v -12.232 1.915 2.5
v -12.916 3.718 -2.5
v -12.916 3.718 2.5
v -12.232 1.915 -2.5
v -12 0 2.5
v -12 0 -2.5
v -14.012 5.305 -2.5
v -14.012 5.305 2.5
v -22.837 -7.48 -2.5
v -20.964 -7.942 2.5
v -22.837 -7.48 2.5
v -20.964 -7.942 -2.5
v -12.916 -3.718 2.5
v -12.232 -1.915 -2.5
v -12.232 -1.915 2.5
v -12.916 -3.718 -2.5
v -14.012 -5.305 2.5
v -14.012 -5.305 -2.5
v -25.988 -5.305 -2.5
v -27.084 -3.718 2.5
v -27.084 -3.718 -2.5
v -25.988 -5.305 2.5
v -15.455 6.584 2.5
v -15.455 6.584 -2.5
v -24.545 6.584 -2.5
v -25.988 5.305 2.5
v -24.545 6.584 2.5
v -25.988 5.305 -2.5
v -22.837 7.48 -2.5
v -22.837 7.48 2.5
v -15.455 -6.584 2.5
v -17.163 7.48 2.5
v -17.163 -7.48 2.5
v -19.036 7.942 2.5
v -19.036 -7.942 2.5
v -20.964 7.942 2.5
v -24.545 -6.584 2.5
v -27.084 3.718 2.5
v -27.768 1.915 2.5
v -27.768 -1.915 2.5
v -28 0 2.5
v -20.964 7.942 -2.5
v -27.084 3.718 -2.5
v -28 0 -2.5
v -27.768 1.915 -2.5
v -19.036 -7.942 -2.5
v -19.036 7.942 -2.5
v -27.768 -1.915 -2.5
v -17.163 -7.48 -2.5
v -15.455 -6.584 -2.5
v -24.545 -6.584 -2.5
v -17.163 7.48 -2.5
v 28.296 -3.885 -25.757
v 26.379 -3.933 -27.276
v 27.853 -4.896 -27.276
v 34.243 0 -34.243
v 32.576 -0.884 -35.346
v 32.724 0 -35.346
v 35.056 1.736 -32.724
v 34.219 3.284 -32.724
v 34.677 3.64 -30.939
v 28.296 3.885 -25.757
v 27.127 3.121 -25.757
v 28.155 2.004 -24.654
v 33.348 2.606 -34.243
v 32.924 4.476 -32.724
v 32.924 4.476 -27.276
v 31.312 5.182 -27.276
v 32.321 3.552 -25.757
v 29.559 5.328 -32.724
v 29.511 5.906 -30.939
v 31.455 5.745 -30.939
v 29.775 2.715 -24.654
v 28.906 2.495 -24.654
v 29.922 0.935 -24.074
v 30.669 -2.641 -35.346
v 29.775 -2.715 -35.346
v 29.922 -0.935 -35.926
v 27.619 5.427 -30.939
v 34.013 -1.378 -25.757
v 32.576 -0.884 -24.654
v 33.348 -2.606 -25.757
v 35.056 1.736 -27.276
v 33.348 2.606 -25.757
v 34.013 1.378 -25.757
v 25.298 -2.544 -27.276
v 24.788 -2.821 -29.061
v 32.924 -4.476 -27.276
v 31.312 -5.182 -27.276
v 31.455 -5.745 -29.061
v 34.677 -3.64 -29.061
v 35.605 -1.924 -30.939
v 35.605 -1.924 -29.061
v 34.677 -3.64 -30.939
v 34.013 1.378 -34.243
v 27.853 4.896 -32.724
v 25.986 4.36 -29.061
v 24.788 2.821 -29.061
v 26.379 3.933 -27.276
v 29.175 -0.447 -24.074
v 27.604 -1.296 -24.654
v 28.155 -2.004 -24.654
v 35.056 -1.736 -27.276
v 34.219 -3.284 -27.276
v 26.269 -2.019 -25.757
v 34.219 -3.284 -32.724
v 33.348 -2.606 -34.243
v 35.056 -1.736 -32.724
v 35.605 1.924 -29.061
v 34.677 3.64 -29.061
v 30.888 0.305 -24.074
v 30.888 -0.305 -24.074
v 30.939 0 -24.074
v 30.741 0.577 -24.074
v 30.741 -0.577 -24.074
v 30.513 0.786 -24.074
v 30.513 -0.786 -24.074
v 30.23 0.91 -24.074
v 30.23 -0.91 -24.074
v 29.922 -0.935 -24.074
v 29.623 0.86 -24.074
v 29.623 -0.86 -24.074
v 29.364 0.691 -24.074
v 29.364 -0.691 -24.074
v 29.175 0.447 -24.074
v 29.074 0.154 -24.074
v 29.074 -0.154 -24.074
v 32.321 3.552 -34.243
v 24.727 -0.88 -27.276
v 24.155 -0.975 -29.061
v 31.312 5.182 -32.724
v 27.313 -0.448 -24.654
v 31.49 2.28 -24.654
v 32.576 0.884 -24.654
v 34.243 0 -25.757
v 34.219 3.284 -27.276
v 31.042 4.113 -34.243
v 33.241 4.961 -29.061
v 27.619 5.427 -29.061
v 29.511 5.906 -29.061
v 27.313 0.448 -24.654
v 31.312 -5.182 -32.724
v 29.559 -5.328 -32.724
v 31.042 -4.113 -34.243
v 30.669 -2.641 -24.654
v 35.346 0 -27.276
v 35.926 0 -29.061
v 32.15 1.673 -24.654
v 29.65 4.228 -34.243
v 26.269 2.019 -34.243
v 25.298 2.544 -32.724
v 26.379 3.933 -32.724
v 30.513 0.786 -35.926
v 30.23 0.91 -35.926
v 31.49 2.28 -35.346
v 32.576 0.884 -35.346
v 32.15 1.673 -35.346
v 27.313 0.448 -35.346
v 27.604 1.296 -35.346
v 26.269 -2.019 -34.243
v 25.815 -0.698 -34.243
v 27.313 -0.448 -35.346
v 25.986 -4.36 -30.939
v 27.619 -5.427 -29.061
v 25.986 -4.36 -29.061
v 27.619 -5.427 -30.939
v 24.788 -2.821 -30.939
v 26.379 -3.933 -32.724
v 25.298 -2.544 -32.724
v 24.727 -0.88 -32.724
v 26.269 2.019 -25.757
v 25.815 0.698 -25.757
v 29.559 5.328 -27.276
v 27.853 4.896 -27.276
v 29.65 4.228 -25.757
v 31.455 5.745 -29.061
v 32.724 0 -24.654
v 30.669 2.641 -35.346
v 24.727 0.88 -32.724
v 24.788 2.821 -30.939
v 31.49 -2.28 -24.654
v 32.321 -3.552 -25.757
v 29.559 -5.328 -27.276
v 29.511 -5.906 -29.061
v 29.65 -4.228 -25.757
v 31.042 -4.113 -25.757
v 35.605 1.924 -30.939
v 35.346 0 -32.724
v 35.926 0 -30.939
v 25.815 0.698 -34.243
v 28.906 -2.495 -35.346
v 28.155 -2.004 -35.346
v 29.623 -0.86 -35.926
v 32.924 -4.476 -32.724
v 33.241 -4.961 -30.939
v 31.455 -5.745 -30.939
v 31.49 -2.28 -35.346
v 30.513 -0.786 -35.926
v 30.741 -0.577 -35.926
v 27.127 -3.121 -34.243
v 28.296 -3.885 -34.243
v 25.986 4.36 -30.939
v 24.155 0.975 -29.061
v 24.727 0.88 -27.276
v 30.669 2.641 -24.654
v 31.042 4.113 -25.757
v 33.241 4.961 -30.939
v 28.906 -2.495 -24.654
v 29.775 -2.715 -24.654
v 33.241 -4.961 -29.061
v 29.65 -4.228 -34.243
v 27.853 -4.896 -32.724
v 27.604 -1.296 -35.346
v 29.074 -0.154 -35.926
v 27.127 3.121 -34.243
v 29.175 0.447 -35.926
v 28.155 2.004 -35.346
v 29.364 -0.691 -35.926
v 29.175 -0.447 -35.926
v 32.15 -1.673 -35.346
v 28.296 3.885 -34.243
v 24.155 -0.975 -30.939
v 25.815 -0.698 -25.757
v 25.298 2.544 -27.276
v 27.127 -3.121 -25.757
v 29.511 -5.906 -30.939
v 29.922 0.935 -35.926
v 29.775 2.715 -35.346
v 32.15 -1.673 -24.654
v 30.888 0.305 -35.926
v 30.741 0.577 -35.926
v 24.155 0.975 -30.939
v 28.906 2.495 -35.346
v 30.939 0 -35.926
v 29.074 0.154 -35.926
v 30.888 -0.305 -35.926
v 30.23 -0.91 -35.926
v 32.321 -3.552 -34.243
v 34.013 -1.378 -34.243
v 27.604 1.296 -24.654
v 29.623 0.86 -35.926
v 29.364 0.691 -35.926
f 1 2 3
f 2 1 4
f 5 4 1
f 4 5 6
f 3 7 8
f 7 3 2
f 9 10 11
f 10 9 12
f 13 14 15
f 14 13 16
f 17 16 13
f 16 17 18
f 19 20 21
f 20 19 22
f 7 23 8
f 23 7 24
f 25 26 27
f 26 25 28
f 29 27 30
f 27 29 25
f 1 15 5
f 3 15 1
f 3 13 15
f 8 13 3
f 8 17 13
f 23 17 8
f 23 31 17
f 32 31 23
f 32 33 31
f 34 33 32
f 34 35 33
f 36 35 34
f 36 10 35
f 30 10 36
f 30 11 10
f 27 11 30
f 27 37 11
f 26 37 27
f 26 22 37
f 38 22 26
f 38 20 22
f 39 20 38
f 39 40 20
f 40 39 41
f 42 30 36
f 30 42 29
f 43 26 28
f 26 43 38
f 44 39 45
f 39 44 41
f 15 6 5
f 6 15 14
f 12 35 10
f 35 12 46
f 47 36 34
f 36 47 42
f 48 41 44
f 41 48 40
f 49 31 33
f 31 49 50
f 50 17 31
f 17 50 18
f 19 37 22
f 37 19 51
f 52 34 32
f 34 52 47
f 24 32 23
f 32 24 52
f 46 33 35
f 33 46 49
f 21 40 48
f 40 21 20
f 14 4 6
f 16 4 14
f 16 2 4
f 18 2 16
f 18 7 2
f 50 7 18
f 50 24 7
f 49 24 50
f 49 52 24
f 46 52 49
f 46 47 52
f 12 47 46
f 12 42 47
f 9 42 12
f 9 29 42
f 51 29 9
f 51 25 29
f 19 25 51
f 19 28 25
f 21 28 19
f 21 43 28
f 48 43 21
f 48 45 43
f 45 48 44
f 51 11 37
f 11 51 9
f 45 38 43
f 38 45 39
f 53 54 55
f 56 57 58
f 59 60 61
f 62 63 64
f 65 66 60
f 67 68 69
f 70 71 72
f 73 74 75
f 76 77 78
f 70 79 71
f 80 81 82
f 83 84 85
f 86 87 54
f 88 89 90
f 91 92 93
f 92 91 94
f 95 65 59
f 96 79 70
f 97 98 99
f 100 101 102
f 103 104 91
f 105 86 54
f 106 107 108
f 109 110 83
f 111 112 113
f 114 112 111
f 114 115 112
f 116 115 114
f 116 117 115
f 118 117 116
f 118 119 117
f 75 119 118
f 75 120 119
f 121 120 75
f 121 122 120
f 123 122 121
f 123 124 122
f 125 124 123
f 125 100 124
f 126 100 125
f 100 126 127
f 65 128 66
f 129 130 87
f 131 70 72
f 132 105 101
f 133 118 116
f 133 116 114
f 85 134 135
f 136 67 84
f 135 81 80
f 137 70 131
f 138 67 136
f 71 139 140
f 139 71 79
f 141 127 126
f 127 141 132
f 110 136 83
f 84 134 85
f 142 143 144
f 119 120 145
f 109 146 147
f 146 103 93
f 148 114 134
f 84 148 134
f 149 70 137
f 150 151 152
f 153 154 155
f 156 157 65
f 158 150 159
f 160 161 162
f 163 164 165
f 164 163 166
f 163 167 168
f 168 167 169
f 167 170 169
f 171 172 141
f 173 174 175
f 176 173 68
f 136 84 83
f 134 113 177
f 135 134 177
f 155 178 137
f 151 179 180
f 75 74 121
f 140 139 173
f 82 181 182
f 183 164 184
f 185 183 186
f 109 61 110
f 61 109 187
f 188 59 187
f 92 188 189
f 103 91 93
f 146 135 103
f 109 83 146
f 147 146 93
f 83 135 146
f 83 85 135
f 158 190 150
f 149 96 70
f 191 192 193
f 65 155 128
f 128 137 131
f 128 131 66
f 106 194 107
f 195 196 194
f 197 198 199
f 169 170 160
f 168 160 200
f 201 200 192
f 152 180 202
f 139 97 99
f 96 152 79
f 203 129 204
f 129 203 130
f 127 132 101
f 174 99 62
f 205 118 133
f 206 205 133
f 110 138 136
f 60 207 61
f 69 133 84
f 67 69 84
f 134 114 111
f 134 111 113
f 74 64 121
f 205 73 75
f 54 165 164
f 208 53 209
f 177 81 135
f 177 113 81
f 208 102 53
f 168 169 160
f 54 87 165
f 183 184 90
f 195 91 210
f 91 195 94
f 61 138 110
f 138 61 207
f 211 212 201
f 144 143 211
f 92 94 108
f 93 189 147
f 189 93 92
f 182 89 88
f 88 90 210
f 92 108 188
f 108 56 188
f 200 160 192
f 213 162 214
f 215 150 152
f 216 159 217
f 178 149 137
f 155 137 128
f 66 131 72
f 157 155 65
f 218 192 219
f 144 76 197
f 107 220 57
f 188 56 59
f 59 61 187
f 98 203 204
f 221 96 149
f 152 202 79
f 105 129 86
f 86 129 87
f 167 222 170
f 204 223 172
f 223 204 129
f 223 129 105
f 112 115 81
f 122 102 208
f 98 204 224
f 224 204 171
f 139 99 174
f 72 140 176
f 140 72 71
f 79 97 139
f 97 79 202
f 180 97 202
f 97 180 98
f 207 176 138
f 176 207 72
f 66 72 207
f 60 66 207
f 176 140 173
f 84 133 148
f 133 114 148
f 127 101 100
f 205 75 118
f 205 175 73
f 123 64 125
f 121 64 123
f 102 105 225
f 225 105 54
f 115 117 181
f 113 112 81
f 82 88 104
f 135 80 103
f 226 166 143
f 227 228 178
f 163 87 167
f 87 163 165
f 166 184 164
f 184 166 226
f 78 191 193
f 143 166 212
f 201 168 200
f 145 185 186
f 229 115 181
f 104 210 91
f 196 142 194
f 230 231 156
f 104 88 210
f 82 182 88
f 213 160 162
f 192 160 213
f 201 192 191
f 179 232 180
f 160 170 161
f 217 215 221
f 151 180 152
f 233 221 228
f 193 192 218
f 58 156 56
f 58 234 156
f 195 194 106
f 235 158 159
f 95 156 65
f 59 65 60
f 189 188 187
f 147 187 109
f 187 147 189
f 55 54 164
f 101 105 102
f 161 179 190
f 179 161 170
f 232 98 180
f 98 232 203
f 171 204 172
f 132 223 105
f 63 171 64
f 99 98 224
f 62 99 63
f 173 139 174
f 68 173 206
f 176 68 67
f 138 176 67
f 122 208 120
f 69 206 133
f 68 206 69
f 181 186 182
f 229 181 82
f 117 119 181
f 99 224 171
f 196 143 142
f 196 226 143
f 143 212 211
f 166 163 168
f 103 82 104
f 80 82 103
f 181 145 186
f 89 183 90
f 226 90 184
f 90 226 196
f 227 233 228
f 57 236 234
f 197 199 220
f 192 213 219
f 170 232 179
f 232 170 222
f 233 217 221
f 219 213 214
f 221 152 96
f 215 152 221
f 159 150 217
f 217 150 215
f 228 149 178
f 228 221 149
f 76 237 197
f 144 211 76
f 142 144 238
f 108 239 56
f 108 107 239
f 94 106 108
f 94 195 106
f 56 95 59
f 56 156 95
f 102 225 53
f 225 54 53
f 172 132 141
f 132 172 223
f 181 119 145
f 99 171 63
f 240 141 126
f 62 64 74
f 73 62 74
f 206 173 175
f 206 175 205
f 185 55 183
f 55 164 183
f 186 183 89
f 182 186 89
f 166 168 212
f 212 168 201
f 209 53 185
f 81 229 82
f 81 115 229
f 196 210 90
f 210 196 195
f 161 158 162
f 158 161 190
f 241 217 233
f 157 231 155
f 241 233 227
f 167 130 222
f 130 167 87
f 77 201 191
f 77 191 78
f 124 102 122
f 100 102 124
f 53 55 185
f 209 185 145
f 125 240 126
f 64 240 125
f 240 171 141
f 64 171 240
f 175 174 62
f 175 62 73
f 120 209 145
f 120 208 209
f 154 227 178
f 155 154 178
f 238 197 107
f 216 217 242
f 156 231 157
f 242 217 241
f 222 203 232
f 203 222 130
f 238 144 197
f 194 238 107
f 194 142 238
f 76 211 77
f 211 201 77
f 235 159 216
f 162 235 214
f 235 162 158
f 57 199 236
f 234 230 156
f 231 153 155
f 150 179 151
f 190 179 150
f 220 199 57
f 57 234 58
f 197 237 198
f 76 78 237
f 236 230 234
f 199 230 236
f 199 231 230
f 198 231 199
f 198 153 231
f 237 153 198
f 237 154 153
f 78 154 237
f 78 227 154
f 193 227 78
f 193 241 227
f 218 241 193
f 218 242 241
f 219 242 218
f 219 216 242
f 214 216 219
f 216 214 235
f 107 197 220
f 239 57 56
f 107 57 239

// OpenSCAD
// Generated by generate_scads.py
union() {
  translate([-20,0,0]) {
    cylinder(h=5, r=8, center=true);
  }
  translate([30,0,-30]) {
    sphere(r=6);
  }
}
